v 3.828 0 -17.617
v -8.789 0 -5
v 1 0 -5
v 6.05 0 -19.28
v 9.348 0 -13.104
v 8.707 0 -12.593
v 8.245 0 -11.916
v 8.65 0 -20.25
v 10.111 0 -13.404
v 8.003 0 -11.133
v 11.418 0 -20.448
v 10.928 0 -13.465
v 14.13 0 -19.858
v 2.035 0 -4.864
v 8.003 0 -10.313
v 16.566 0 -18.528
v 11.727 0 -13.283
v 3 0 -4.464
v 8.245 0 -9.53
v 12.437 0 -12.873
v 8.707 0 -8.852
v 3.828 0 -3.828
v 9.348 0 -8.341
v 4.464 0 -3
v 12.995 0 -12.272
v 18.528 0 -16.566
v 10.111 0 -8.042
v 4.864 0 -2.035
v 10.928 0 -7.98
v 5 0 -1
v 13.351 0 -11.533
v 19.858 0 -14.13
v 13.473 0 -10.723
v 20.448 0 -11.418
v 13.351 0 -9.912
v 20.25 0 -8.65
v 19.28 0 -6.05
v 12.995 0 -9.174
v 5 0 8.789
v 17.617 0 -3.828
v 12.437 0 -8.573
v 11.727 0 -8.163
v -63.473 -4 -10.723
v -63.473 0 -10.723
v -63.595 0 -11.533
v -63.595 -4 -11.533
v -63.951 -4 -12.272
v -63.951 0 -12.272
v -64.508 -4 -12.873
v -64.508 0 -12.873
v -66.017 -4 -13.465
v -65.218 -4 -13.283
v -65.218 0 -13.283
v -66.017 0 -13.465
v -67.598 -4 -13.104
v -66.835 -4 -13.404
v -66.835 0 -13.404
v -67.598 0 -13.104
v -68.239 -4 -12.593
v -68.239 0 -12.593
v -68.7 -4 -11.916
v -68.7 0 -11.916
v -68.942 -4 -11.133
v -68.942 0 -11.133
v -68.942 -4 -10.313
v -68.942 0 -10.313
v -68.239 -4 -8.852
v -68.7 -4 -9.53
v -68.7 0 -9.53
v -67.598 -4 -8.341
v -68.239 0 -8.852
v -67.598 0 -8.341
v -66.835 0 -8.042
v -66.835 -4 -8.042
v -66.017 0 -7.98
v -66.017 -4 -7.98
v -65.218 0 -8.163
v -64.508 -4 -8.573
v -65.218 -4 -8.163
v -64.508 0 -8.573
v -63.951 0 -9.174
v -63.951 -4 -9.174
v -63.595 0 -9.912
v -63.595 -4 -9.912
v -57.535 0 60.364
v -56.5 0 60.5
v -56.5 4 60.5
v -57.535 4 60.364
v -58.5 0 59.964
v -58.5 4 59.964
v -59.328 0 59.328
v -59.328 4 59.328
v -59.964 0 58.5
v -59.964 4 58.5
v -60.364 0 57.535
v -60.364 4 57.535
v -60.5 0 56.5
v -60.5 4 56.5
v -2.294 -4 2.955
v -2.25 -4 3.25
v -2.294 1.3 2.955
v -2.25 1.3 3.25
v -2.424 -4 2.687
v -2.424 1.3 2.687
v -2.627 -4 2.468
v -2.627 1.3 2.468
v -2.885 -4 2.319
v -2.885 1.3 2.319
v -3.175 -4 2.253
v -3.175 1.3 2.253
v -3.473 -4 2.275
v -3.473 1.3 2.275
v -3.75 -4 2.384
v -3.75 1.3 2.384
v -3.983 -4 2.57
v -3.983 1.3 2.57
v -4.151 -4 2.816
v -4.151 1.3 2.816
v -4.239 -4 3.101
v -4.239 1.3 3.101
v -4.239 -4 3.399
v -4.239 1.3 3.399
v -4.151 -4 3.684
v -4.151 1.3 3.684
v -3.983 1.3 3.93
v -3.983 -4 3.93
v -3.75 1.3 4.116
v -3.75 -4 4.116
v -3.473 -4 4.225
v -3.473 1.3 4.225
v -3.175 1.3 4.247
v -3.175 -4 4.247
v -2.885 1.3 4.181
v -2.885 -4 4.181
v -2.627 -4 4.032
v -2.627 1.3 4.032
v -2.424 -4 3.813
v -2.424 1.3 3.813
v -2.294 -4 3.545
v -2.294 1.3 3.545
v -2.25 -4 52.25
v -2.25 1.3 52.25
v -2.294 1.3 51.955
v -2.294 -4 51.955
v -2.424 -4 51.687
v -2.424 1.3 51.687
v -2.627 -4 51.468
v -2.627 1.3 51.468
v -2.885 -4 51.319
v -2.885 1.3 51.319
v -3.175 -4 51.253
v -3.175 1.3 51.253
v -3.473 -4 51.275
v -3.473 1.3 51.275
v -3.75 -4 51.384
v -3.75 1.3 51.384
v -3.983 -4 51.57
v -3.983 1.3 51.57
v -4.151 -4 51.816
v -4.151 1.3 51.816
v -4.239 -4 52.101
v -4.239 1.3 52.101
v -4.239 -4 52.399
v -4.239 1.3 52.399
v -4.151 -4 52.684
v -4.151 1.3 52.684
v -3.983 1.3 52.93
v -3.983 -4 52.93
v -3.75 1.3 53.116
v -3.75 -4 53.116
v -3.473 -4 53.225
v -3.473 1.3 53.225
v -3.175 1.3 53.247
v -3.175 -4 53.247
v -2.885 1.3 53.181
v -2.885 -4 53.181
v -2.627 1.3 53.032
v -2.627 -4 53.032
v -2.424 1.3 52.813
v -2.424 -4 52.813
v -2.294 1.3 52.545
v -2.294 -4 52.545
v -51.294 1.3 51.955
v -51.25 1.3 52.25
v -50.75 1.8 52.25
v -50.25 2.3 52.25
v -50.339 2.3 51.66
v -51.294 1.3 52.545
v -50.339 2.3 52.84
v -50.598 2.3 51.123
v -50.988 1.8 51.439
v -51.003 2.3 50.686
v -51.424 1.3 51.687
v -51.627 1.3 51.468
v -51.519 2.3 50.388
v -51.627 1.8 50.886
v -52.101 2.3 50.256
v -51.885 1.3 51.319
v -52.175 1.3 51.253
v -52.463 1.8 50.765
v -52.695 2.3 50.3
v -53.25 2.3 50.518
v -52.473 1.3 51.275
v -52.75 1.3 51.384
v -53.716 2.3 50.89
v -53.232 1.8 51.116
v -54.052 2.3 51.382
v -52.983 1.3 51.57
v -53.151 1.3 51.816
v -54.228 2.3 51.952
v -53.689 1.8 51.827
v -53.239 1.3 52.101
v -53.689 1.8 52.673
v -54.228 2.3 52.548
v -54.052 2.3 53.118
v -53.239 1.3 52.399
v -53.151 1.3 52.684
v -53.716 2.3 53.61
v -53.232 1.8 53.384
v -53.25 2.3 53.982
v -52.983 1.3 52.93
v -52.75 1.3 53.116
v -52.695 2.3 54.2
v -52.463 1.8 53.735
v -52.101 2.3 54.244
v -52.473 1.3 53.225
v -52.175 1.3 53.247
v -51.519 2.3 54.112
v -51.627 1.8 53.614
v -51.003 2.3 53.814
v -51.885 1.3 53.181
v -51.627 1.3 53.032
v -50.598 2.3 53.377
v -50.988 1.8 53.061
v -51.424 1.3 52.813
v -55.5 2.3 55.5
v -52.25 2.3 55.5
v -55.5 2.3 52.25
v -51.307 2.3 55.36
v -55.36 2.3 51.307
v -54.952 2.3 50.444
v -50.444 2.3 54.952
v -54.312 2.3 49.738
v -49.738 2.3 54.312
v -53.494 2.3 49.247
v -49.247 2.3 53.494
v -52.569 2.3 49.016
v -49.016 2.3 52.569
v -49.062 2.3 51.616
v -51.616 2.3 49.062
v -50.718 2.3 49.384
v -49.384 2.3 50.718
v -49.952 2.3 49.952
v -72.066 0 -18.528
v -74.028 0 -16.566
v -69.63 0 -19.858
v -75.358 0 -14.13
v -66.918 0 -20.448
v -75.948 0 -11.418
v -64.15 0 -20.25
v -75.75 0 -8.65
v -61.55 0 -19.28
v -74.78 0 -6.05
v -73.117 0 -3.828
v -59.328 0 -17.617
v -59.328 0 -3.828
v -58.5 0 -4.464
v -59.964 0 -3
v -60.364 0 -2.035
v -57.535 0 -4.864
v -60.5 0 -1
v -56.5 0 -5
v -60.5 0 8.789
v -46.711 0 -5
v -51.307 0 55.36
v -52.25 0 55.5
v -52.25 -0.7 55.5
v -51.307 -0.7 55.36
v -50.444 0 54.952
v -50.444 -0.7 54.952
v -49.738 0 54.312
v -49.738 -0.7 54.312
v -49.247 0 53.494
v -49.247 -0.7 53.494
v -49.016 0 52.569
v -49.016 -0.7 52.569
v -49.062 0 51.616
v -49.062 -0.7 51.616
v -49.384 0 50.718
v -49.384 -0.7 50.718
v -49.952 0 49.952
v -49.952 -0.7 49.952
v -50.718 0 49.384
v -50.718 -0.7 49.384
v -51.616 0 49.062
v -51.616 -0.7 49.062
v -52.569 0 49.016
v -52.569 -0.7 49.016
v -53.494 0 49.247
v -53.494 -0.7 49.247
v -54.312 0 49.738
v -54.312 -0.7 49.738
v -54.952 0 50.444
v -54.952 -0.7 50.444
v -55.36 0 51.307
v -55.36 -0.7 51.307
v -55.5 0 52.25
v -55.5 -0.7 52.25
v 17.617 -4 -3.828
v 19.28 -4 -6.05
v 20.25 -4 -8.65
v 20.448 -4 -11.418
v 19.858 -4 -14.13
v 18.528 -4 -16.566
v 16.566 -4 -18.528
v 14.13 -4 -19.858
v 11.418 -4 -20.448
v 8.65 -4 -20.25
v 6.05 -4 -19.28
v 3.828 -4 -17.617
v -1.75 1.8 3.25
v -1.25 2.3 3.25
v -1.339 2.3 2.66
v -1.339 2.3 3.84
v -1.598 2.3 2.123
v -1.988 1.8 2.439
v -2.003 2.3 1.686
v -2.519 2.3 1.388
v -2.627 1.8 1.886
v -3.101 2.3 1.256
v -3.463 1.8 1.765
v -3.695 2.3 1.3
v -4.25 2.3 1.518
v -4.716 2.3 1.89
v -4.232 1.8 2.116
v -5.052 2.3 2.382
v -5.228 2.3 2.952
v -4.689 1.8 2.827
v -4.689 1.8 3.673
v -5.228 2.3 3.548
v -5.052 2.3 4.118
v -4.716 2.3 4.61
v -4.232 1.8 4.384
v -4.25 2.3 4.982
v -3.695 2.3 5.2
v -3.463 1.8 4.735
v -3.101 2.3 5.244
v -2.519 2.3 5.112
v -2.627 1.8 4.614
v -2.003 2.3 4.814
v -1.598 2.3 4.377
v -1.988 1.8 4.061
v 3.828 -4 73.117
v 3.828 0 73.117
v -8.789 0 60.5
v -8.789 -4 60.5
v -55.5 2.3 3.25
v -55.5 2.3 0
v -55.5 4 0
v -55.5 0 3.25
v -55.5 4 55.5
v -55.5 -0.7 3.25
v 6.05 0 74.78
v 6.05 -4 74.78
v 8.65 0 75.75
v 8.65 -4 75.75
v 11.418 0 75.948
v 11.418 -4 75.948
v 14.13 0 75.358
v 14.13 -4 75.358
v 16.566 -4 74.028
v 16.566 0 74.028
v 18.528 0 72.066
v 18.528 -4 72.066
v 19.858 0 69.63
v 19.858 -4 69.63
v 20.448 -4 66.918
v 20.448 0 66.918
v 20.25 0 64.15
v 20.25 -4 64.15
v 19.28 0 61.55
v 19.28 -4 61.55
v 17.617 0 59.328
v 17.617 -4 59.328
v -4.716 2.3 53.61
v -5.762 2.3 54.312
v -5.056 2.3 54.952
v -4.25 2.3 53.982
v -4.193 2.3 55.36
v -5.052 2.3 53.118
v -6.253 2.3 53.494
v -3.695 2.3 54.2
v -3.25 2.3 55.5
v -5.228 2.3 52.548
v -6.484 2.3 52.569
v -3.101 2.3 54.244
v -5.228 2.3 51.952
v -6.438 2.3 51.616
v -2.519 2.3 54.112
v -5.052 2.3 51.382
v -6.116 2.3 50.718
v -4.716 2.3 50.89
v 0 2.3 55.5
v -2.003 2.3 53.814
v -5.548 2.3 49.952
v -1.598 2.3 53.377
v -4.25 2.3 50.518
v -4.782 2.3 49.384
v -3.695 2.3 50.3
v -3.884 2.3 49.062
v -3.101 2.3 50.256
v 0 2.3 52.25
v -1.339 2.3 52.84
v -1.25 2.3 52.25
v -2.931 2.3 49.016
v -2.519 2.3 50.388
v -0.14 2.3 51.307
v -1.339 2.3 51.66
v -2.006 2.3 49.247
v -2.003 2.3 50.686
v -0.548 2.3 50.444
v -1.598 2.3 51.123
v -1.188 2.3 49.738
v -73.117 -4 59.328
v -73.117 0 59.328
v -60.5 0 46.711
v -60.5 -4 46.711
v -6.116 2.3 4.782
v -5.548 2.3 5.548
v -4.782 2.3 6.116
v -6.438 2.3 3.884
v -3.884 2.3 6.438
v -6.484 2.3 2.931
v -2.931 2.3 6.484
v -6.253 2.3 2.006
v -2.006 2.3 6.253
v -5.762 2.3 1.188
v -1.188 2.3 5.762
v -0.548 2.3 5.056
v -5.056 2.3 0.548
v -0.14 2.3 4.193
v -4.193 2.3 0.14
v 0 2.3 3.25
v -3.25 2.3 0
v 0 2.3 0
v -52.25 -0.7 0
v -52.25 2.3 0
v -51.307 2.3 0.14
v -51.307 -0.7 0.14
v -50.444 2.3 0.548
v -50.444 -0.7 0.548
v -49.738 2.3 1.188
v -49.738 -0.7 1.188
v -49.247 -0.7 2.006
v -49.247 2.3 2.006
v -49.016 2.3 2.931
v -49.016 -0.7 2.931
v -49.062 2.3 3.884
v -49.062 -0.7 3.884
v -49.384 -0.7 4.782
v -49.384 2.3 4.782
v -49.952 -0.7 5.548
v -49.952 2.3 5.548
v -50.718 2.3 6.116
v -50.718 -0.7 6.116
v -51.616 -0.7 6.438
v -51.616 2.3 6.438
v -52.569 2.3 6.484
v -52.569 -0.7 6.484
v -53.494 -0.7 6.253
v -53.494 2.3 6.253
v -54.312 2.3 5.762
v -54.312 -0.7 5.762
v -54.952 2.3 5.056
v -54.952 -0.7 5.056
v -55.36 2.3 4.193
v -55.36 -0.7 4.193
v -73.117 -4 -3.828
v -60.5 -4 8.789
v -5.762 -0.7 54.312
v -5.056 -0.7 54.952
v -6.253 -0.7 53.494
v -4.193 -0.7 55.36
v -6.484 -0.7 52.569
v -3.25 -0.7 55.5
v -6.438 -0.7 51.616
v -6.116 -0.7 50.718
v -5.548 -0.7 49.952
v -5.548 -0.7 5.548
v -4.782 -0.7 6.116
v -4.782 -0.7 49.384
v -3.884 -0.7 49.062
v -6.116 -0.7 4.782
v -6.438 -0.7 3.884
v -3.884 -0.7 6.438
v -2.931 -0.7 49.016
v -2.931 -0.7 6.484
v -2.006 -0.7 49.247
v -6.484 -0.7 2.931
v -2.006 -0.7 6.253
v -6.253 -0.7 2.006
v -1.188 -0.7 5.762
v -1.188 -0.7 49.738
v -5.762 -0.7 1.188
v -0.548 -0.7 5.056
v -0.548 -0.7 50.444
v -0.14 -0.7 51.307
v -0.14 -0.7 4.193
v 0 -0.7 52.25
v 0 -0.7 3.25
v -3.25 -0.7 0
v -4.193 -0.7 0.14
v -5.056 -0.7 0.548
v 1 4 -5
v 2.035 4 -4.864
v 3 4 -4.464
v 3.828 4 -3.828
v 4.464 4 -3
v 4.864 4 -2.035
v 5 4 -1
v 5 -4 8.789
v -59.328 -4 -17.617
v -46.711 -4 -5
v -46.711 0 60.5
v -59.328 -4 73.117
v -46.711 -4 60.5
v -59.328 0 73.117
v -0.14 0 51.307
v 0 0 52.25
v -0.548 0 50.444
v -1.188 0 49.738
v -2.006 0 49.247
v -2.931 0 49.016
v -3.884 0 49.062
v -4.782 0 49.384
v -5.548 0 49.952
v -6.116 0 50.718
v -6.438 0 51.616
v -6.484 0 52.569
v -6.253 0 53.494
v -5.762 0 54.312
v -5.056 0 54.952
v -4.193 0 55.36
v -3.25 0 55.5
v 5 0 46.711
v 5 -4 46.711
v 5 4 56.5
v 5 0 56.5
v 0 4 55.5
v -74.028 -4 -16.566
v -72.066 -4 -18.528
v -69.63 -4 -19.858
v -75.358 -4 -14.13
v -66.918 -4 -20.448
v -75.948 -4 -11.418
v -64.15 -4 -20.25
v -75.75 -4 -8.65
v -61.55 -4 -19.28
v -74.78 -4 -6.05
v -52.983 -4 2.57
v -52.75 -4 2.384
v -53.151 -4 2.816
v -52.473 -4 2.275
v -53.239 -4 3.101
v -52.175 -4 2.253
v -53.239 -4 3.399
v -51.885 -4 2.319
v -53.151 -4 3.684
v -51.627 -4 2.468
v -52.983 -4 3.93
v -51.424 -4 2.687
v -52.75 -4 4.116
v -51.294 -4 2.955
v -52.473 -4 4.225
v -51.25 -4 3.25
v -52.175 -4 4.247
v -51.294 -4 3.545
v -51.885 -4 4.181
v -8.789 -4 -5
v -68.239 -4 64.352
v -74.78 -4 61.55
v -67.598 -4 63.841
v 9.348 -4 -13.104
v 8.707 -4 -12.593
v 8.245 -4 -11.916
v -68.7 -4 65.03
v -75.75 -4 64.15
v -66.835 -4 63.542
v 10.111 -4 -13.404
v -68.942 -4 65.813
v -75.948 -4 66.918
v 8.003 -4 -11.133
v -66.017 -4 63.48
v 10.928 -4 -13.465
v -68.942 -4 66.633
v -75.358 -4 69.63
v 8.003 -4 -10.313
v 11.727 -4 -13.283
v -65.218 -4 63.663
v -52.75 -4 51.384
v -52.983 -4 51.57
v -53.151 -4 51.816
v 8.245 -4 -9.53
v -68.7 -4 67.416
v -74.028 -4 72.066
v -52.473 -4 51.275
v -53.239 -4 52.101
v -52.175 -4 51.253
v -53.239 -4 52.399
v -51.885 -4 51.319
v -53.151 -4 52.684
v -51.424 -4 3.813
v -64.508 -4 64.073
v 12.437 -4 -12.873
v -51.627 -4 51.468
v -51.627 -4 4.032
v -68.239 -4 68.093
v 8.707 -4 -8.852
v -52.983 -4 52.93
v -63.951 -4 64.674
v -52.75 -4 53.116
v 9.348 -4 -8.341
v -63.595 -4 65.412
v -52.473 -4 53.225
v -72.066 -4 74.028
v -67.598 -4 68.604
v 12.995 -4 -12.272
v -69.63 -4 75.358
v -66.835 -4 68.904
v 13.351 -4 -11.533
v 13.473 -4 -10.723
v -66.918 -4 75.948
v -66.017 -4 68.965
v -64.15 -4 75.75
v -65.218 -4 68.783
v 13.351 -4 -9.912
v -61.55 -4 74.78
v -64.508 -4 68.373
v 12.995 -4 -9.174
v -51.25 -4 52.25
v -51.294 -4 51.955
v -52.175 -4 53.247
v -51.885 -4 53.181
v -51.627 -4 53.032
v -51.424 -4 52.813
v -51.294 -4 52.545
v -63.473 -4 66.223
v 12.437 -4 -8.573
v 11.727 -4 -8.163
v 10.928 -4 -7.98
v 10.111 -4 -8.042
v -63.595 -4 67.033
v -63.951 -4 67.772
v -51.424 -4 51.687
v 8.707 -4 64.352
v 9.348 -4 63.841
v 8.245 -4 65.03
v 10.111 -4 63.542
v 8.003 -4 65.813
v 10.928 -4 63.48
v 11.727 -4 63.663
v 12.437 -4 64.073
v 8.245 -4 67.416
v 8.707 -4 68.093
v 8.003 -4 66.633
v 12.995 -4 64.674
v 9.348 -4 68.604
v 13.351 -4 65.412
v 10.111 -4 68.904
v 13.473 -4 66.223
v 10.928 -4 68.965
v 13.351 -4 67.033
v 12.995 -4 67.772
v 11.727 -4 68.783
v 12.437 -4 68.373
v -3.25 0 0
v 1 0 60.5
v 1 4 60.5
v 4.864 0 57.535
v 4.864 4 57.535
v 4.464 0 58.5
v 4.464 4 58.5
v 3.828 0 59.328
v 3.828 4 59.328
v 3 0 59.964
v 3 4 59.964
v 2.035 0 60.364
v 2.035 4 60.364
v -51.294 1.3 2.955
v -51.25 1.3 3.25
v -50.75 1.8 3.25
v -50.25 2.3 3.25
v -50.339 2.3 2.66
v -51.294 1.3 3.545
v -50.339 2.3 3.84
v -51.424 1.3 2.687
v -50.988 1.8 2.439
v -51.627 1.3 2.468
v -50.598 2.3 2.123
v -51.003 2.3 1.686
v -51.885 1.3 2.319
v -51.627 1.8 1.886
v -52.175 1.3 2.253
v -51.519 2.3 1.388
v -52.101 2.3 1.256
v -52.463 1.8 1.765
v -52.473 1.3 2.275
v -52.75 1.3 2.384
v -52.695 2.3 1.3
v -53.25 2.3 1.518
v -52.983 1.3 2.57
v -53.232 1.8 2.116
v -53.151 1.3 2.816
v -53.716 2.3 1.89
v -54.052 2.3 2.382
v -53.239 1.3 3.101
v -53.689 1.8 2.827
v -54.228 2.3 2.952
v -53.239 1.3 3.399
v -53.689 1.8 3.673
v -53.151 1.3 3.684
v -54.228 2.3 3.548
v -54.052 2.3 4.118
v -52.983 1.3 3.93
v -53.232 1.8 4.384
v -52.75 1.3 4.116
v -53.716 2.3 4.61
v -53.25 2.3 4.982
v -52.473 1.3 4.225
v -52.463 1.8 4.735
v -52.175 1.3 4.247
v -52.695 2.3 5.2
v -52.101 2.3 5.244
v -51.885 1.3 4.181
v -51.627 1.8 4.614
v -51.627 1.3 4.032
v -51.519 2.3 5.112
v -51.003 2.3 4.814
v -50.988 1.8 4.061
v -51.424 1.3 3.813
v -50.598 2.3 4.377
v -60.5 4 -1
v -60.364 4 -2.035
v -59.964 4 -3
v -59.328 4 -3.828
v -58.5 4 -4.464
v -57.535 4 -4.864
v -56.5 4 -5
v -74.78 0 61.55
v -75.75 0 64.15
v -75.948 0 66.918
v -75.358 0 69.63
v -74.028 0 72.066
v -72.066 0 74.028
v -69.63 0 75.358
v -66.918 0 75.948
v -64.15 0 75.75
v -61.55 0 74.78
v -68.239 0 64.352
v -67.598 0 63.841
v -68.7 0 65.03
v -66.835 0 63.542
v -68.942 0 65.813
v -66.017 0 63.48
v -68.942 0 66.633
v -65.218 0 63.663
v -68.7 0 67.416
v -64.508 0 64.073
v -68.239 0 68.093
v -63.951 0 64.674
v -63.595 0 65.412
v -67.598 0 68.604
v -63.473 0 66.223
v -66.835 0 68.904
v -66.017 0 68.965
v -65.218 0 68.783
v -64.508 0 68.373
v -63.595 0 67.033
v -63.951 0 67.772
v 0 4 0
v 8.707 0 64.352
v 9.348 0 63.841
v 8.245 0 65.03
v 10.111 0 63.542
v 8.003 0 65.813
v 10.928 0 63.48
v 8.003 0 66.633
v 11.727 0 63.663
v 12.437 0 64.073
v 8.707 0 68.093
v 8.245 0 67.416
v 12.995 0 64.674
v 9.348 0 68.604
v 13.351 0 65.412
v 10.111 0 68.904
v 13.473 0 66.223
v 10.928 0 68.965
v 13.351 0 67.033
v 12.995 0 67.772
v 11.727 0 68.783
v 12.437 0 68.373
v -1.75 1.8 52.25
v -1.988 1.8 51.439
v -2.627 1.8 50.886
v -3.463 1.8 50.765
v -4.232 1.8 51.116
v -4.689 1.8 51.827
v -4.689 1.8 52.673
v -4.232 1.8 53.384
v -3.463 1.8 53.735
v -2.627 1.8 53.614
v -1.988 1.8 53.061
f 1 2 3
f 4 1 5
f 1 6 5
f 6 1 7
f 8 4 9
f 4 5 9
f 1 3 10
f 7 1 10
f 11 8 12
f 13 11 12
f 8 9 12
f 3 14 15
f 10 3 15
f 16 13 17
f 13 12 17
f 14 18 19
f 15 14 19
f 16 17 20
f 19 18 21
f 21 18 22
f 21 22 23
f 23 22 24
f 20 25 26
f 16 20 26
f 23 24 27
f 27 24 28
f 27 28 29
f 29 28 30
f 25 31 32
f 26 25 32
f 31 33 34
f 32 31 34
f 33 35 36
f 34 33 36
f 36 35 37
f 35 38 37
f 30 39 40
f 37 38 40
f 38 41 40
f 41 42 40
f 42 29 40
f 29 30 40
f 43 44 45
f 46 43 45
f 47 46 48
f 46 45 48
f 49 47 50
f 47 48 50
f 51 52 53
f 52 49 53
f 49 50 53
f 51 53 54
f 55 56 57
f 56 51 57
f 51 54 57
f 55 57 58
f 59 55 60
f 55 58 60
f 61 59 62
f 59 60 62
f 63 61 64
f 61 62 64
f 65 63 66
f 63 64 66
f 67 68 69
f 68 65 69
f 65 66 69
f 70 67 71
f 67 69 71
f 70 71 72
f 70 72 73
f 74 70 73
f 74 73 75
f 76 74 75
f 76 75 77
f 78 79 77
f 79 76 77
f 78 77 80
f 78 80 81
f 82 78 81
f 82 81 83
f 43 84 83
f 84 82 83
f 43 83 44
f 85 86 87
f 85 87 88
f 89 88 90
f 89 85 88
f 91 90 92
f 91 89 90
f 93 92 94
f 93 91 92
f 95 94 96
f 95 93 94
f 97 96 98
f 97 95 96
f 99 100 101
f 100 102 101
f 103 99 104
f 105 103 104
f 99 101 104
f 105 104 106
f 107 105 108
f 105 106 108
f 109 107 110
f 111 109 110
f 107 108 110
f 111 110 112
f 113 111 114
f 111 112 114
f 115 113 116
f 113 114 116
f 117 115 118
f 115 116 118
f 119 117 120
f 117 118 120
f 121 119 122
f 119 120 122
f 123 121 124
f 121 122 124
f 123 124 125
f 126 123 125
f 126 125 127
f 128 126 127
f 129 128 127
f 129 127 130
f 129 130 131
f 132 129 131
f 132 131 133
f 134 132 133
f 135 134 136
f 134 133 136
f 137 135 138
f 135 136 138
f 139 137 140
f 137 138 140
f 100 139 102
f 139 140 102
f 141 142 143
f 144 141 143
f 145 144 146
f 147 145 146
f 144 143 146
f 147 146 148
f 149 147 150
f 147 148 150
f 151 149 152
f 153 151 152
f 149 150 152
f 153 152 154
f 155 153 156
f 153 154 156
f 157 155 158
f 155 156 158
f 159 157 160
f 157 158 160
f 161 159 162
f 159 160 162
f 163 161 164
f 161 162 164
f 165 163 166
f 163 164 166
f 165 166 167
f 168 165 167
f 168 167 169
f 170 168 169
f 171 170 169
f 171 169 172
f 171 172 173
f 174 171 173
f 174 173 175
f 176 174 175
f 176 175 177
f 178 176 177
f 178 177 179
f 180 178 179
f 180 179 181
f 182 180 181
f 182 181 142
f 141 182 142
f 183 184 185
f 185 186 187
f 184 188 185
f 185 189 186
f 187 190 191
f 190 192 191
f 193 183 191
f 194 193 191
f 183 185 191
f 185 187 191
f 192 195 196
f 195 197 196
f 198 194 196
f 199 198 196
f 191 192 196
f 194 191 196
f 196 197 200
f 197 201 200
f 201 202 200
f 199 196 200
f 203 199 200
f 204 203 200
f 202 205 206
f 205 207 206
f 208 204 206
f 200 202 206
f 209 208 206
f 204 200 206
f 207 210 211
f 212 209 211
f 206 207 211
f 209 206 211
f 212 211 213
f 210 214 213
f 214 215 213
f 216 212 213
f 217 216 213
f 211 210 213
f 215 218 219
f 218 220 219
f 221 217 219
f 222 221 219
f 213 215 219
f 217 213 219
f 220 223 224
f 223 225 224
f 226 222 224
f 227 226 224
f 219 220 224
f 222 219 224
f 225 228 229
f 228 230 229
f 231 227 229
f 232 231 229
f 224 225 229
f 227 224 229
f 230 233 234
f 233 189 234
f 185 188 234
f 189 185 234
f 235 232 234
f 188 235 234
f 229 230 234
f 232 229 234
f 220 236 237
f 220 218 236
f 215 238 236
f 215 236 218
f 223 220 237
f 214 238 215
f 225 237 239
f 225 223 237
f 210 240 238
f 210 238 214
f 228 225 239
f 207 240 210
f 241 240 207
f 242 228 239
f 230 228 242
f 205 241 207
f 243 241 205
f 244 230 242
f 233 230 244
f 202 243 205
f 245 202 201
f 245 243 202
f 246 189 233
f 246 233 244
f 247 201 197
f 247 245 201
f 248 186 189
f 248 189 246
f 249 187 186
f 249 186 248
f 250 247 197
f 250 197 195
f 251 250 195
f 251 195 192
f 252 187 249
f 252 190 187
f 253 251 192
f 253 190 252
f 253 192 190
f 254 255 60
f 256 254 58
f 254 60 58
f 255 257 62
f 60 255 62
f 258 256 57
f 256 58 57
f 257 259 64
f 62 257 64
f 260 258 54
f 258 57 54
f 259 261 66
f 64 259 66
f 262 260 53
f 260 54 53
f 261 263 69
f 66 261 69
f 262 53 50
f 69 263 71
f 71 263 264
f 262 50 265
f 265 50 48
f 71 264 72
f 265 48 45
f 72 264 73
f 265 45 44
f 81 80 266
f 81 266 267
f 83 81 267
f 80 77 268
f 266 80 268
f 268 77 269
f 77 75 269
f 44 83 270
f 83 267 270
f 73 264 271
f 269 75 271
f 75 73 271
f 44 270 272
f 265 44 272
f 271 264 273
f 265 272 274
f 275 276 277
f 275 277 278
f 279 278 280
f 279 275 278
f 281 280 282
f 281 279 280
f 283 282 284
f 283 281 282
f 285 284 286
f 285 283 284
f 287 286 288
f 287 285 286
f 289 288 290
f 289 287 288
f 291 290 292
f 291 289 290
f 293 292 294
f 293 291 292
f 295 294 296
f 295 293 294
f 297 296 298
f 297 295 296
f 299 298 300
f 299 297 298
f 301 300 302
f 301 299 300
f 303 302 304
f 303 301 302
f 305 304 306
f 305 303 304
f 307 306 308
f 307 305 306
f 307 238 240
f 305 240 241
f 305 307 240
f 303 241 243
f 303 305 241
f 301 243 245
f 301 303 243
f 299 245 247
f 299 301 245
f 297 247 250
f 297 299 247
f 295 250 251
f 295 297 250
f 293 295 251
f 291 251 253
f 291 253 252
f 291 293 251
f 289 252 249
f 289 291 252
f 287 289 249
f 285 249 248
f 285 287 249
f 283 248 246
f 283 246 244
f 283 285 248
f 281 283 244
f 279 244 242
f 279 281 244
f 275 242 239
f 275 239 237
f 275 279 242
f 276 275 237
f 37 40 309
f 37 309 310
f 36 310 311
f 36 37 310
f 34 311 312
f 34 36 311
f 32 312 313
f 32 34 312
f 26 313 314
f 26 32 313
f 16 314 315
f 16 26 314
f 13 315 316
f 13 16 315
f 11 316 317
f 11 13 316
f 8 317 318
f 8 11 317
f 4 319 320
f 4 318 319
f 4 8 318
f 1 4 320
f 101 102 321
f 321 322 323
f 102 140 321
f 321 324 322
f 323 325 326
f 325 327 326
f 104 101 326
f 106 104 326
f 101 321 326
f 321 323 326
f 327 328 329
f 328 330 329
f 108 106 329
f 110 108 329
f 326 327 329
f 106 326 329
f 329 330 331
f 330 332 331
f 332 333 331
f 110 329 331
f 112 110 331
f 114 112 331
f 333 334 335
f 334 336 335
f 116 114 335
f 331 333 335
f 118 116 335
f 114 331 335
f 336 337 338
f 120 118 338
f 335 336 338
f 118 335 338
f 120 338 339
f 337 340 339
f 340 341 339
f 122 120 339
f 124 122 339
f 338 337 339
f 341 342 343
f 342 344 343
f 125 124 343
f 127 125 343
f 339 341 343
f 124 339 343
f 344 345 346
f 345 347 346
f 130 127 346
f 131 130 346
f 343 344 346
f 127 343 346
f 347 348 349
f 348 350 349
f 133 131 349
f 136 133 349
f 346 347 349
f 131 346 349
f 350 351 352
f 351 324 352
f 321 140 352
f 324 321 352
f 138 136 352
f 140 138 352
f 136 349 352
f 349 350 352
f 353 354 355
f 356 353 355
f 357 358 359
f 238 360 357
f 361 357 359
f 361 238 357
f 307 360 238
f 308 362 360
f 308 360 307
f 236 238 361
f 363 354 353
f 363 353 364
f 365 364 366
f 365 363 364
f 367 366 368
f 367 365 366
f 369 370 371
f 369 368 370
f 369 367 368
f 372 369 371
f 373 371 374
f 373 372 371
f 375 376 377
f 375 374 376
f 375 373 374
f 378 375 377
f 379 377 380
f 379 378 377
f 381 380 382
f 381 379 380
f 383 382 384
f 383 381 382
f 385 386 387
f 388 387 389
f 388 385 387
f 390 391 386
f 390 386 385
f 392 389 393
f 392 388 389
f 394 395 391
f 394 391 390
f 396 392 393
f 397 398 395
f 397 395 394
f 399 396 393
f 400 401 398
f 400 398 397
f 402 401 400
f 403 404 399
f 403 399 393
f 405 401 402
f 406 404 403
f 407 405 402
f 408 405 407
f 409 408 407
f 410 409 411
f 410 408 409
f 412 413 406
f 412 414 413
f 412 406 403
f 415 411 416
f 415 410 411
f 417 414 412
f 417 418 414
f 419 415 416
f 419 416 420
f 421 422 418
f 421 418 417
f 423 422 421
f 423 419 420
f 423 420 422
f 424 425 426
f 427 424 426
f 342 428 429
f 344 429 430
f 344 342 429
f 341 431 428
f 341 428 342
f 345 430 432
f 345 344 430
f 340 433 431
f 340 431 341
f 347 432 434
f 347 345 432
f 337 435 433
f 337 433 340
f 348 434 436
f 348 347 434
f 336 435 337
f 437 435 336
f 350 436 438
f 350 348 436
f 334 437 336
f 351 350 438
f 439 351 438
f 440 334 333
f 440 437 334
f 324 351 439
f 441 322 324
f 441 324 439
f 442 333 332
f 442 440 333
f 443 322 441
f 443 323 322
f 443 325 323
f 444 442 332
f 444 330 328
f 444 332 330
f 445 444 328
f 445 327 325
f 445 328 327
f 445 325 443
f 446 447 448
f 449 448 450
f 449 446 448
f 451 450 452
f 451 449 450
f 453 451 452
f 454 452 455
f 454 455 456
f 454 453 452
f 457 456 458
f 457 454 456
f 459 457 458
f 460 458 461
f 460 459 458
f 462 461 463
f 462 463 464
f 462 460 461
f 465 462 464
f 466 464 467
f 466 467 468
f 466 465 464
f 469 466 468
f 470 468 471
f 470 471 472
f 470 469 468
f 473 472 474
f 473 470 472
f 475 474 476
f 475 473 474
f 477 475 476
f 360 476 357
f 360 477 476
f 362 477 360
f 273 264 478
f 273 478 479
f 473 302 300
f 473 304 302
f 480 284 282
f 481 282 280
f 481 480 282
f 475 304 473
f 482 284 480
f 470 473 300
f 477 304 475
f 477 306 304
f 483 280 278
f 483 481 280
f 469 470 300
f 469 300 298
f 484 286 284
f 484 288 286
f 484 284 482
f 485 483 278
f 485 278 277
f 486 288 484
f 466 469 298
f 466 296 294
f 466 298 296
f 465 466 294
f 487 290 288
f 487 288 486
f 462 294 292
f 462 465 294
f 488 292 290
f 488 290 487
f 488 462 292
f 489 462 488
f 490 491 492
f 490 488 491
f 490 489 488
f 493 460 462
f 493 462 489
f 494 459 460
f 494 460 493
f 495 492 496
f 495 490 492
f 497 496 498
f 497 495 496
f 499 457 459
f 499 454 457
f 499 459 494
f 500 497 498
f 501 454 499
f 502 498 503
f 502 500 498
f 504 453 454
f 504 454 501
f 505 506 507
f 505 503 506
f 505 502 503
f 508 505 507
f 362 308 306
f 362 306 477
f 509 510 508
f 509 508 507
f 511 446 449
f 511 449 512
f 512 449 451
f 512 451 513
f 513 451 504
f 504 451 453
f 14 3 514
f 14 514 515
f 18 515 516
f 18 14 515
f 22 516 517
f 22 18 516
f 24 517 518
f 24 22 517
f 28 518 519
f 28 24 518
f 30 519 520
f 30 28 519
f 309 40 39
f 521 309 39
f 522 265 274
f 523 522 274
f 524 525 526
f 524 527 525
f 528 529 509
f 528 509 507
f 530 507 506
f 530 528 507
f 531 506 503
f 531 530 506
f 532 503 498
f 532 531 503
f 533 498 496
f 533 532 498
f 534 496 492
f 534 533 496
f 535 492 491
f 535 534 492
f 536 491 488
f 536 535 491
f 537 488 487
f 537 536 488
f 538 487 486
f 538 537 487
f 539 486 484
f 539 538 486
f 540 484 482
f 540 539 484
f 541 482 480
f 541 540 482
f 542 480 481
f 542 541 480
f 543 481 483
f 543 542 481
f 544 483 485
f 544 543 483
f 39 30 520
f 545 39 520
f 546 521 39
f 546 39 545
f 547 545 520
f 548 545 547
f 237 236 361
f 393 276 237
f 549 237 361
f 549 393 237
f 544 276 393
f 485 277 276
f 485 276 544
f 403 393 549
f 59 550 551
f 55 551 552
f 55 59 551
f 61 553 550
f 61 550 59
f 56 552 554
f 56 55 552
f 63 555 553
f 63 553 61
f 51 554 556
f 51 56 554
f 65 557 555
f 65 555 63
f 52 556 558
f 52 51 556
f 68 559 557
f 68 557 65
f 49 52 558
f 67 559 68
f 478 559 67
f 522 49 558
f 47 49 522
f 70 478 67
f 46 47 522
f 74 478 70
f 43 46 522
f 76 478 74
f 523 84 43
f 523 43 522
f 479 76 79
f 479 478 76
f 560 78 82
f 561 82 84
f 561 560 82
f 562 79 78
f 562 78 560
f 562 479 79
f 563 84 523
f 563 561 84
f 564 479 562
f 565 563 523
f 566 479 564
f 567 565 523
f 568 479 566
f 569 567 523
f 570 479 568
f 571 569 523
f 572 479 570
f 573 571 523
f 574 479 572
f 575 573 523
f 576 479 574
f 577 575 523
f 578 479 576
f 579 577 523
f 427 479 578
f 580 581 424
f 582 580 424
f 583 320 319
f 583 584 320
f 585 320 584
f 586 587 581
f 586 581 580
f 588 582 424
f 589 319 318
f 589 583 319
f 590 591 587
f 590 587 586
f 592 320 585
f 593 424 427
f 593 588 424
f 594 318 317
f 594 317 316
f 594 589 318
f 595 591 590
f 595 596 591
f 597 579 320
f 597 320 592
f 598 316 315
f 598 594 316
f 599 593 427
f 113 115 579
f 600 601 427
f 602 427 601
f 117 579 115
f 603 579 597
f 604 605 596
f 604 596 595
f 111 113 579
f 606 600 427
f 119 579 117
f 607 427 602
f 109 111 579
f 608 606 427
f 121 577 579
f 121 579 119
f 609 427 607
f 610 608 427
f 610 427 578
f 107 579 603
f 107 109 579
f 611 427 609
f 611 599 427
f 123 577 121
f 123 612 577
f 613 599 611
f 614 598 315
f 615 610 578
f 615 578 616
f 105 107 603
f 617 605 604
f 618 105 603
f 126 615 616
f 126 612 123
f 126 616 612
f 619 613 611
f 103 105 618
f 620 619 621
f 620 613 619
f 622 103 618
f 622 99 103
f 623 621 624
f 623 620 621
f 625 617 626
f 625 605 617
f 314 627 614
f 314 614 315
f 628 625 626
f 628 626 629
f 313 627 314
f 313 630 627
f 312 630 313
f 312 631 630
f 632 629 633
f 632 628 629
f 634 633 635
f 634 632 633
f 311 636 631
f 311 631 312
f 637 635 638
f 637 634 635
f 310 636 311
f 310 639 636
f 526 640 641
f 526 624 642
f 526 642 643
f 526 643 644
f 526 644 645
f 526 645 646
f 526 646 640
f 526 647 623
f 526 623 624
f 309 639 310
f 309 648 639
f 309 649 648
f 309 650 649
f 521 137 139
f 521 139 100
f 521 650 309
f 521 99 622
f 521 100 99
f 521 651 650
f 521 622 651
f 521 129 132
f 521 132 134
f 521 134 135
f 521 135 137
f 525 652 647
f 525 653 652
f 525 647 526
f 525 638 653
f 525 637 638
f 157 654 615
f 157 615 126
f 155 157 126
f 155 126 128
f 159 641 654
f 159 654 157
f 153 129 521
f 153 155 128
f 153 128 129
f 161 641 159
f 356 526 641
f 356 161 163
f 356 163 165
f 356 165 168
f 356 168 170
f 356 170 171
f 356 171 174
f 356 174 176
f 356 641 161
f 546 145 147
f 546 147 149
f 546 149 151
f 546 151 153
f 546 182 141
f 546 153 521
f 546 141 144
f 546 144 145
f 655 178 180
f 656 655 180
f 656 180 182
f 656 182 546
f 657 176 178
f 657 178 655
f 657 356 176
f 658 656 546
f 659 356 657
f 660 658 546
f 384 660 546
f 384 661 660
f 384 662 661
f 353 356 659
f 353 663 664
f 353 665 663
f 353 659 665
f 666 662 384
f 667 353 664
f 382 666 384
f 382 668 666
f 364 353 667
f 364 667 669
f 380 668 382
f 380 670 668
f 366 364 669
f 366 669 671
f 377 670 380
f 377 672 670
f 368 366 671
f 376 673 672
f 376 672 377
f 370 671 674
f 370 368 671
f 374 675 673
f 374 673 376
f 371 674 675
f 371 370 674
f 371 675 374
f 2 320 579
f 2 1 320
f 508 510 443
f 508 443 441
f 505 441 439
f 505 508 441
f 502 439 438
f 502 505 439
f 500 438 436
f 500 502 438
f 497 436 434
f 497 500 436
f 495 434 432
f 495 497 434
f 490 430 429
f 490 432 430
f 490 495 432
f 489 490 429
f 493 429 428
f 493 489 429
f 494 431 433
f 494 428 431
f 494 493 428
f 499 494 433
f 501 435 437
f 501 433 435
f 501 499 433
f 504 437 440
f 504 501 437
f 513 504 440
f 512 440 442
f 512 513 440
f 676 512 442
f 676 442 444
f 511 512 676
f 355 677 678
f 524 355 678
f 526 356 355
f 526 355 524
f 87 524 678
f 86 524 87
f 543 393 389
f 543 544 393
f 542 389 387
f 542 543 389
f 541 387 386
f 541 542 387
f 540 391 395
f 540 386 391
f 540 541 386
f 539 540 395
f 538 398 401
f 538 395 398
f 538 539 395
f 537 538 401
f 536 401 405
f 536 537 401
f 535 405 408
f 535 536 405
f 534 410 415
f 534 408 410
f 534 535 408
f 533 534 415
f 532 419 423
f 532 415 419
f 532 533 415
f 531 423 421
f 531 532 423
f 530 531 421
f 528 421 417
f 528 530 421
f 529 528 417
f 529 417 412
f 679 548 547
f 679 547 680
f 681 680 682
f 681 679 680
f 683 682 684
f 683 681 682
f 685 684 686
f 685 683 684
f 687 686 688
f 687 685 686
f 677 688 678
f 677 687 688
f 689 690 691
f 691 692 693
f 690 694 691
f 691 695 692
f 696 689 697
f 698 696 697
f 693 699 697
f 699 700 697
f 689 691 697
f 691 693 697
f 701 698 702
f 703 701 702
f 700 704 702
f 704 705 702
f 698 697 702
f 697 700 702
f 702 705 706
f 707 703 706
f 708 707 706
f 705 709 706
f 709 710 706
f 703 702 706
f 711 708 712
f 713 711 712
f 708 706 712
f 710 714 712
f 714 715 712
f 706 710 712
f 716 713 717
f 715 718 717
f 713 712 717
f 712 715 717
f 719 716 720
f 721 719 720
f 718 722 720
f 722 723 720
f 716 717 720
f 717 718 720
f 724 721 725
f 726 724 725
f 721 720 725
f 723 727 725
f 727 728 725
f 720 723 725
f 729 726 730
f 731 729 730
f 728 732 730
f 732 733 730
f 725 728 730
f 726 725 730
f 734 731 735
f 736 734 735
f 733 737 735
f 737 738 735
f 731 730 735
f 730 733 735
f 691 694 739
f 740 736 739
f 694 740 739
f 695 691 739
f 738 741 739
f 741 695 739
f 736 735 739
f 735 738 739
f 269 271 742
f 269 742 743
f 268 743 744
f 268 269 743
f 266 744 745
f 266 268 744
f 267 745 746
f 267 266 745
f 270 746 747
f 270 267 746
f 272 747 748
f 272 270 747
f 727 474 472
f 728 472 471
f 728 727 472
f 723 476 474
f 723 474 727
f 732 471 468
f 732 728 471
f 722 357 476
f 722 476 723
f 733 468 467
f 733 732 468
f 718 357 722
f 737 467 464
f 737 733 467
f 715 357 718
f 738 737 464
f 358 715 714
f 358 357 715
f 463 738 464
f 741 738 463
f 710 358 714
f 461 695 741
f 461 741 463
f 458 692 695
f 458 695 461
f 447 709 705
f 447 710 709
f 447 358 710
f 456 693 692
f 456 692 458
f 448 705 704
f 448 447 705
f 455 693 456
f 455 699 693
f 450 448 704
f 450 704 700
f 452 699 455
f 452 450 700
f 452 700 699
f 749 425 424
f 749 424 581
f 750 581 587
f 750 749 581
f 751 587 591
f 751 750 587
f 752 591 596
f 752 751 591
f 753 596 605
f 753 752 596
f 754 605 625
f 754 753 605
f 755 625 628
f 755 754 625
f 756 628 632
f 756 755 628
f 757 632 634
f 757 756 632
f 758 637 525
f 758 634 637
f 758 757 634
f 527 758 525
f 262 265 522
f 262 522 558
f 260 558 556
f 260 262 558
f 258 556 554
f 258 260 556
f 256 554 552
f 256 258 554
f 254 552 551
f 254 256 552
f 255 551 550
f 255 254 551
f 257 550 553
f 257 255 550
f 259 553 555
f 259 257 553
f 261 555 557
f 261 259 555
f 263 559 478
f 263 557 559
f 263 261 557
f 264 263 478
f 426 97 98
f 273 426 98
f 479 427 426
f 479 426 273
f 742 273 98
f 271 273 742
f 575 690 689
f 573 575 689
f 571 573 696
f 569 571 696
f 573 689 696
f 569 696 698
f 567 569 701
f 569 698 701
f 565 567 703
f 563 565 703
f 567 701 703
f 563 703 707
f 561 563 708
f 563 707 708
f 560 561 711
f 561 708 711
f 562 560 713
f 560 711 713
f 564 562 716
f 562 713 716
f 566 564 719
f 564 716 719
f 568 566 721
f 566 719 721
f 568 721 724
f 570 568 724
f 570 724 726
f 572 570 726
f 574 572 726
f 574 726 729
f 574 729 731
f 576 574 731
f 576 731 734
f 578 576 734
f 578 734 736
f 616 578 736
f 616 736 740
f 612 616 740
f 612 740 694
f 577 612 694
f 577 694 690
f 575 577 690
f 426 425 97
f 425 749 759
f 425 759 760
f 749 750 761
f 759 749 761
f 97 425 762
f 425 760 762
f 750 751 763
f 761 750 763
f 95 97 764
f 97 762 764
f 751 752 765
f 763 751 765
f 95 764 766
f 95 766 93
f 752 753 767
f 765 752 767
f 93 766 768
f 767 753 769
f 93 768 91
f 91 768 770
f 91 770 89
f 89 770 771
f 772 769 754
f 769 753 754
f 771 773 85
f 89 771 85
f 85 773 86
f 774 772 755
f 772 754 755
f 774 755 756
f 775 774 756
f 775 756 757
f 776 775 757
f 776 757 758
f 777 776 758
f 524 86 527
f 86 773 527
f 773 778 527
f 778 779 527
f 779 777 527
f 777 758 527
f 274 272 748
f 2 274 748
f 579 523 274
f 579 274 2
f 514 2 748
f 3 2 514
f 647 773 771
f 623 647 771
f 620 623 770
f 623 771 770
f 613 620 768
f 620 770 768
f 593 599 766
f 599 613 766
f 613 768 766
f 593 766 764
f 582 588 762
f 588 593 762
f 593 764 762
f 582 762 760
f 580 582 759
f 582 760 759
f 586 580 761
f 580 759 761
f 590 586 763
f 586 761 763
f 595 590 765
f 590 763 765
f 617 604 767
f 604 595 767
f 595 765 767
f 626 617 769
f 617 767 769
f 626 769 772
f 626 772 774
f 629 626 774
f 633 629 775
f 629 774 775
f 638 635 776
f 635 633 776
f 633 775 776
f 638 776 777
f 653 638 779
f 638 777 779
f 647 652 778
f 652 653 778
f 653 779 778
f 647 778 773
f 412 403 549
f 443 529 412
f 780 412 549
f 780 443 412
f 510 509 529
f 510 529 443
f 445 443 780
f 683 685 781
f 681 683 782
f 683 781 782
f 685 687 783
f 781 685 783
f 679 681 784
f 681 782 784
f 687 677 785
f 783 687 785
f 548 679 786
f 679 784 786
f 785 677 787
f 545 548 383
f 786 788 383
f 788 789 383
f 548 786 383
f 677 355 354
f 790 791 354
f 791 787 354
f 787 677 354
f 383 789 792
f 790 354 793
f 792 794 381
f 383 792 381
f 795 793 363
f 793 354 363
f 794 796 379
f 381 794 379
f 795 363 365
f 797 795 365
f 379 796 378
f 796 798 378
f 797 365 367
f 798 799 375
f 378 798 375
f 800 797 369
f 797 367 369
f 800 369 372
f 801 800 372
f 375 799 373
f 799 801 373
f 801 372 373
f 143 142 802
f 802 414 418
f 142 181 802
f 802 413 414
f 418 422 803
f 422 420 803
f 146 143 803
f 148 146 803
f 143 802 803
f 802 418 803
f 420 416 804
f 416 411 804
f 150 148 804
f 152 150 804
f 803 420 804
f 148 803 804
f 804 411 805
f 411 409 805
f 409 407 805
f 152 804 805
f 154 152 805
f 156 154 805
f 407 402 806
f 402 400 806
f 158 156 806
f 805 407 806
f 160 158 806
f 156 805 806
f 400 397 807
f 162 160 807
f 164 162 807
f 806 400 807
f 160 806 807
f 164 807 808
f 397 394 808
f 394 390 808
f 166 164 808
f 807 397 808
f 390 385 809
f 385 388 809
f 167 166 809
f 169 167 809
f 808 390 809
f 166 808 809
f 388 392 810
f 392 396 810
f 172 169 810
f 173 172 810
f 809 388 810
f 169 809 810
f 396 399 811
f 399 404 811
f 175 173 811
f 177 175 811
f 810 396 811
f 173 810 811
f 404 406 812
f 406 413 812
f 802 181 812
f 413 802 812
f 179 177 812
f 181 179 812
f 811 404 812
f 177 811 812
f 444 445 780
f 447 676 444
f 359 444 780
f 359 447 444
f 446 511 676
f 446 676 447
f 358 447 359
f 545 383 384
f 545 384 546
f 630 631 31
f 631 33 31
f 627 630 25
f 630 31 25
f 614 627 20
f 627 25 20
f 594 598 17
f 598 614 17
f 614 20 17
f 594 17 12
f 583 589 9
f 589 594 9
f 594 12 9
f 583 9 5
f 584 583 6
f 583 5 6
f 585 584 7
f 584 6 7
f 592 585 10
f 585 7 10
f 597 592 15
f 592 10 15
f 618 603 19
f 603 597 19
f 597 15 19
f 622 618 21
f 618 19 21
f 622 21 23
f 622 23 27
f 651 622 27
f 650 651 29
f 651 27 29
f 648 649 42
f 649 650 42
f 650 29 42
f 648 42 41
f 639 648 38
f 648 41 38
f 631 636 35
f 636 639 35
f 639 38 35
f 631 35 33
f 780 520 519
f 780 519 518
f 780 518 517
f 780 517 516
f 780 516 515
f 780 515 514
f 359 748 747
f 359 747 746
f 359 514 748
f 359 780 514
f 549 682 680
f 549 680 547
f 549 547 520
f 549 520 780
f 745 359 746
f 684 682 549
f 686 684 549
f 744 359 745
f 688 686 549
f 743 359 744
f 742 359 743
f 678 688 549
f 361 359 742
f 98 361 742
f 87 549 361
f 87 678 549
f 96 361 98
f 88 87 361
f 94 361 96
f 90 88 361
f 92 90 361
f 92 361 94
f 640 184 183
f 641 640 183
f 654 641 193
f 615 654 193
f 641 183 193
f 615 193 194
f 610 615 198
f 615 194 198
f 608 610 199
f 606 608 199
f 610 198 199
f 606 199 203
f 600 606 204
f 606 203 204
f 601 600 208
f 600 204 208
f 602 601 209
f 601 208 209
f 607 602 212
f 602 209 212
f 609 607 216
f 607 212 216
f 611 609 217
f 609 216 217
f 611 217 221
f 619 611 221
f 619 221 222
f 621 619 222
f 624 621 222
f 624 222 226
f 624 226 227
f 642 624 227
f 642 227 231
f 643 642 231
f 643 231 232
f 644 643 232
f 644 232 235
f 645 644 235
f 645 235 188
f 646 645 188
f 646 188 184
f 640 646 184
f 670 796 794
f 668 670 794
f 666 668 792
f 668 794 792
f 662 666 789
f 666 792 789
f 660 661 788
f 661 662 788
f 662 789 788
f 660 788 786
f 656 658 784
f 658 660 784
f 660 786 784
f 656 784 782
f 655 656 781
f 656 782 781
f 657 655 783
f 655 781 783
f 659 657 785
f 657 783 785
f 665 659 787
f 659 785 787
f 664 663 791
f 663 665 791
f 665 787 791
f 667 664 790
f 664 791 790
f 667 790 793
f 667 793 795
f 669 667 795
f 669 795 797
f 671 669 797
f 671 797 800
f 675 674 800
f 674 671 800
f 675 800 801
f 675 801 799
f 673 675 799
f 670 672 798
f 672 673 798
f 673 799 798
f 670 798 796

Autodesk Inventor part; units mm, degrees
ref_plane "YZ Plane" through (0, 0, 0) normal (1, 0, 0) x (0, 1, 0)
ref_plane "XZ Plane" through (0, 0, 0) normal (0, 1, 0) x (-1, 0, 0)
ref_plane "XY Plane" through (0, 0, 0) normal (0, 0, 1) x (1, 0, 0)
sketch "Sketch1" plane through (0, 0, 0) normal (0, 1, 0) x (-1, 0, 0)
  line L0 (0, 0) -> (55.5, 0)
  line L1 (55.5, 0) -> (55.5, 55.5)
  line L2 (55.5, 55.5) -> (0, 55.5)
  line L3 (0, 55.5) -> (0, 0)
  line L4 (-1, 60.5) -> (56.5, 60.5)
  line L5 (60.5, 56.5) -> (60.5, -1)
  line L6 (56.5, -5) -> (-1, -5)
  line L7 (-5, -1) -> (-5, 56.5)
  arc A0 (60.5, 56.5) -> (56.5, 60.5) centre (56.5, 56.5) ccw
  arc A1 (56.5, -5) -> (60.5, -1) centre (56.5, -1) ccw
  arc A2 (-5, -1) -> (-1, -5) centre (-1, -1) ccw
  arc A3 (-1, 60.5) -> (-5, 56.5) centre (-1, 56.5) ccw
  dimension "d0" = 55.5
  dimension "d1" = 55.5
  dimension "d2" = 5
  dimension "d3" = 4
extrude "Extrusion1" add sketch "Sketch1" along normal blind 4
sketch "Sketch2" plane through (0, 0, 0) normal (0, -1, 0) x (1, 0, 0)
  line L0 (1, -5) -> (-56.5, -5) projected
  arc A0 (1, -5) -> (5, -1) centre (1, -1) ccw projected
  line L1 (5, 56.5) -> (5, -1) projected
  arc A1 (5, 56.5) -> (1, 60.5) centre (1, 56.5) ccw projected
  line L2 (-56.5, 60.5) -> (1, 60.5) projected
  arc A2 (-56.5, 60.5) -> (-60.5, 56.5) centre (-56.5, 56.5) ccw projected
  line L3 (-60.5, -1) -> (-60.5, 56.5) projected
  arc A3 (-60.5, -1) -> (-56.5, -5) centre (-56.5, -1) ccw projected
  line L4 (0, 0) -> (0, 55.5) projected
  line L5 (-55.5, 0) -> (0, 0) projected
  line L6 (-55.5, 55.5) -> (-55.5, 0) projected
  line L7 (0, 55.5) -> (-55.5, 55.5) projected
  line L8 (-77.75, 77.75) -> (22.25, 77.75) construction
  line L9 (22.25, 77.75) -> (22.25, -22.25) construction
  line L10 (22.25, -22.25) -> (-77.75, -22.25) construction
  line L11 (-77.75, -22.25) -> (-77.75, 77.75) construction
  line L12 (-77.75, 77.75) -> (22.25, -22.25) construction
  line L13 (22.25, 77.75) -> (-77.75, -22.25) construction
  circle A4 centre (10.7227, 66.2227) radius 2.75
  arc A5 (17.617, 59.3284) -> (3.8284, 73.117) centre (10.7227, 66.2227) ccw
  arc A6 (5, 56.5) -> (1, 60.5) centre (1, 56.5) ccw projected
  line L14 (17.617, 59.3284) -> (5, 46.7114)
  line L15 (3.8284, 73.117) -> (-8.7886, 60.5)
  line L16 (-59.3284, 73.117) -> (-46.7114, 60.5)
  arc A7 (-59.3284, 73.117) -> (-73.117, 59.3284) centre (-66.2227, 66.2227) ccw
  circle A8 centre (-66.2227, 66.2227) radius 2.75
  line L17 (-73.117, 59.3284) -> (-60.5, 46.7114)
  line L18 (-73.117, -3.8284) -> (-60.5, 8.7886)
  arc A9 (-73.117, -3.8284) -> (-59.3284, -17.617) centre (-66.2227, -10.7227) ccw
  circle A10 centre (-66.2227, -10.7227) radius 2.75
  line L19 (-59.3284, -17.617) -> (-46.7114, -5)
  line L20 (3.8284, -17.617) -> (-8.7886, -5)
  arc A11 (3.8284, -17.617) -> (17.617, -3.8284) centre (10.7227, -10.7227) ccw
  circle A12 centre (10.7227, -10.7227) radius 2.75
  line L21 (17.617, -3.8284) -> (5, 8.7886)
  point P0 (-27.75, 27.75)
  dimension "d6" = 100
  dimension "d7" = 100
  dimension "d8" = 5.5
  dimension "d9" = 7
  dimension "d12" = 360
extrude "Extrusion2" add sketch "Sketch2" along normal blind 4 contours A0 L1 L21 A11 L20 L0 | L0 A3 L3 A2 L2 A1 L1 A0 | L19 A9 L18 L3 A3 L0 | L1 A1 L2 L15 A5 L14 | L17 A7 L16 L2 A2 L3 | L5 L6 L7 L4
sketch "Sketch3" plane through (0, 0, 0) normal (0, 1, 0) x (1, 0, 0)
  line L0 (-52.25, -52.25) -> (-3.25, -52.25) construction
  line L1 (-3.25, -52.25) -> (-3.25, -3.25) construction
  line L2 (-3.25, -3.25) -> (-52.25, -3.25) construction
  line L3 (-52.25, -3.25) -> (-52.25, -52.25) construction
  line L4 (-52.25, -52.25) -> (-52.25, -55.5) construction
  line L5 (-52.25, -52.25) -> (-55.5, -52.25) construction
  line L6 (-55.5, -55.5) -> (-55.5, 0) construction
  line L7 (-3.25, -3.25) -> (0, -3.25) construction
  line L8 (0, 0) -> (0, -55.5) construction
  line L9 (-3.25, -3.25) -> (-3.25, 0) construction
  line L10 (-55.5, 0) -> (0, 0) construction
  line L11 (0, -55.5) -> (-55.5, -55.5) projected
  circle A0 centre (-52.25, -52.25) radius 3.25
  circle A1 centre (-52.25, -3.25) radius 3.25
  circle A2 centre (-3.25, -3.25) radius 3.25
  circle A3 centre (-3.25, -52.25) radius 3.25
  line L12 (-55.5, 0) -> (0, 0) projected
  line L13 (-55.5, -55.5) -> (-55.5, 0) projected
  line L14 (0, -55.5) -> (-55.5, -55.5) projected
  line L15 (0, 0) -> (0, -55.5) projected
  point P0 (-3.25, 0)
  point P1 (0, -3.25)
  point P2 (0, -52.25)
  point P3 (-3.25, -55.5)
  point P4 (-55.5, -3.25)
  point P5 (-52.25, 0)
  dimension "d16" = 49
  dimension "d17" = 49
extrude "Extrusion3" add sketch "Sketch3" along normal blind 2.3 contours L11 A3 L15 | A3 | L11 L13 A0 | A0 | A2 | A2 L12 L15 | L13 L12 A1 | A1
sketch "Sketch4" plane through (0, 2.3, 0) normal (0, 1, 0) x (1, 0, 0)
  arc A0 (0, -52.25) -> (-3.25, -55.5) centre (-3.25, -52.25) ccw projected
  line L0 (0, -3.25) -> (0, -52.25) projected
  arc A1 (-3.25, 0) -> (0, -3.25) centre (-3.25, -3.25) ccw projected
  line L1 (-52.25, 0) -> (-3.25, 0) projected
  arc A2 (-55.5, -3.25) -> (-52.25, 0) centre (-52.25, -3.25) ccw projected
  line L2 (-55.5, -52.25) -> (-55.5, -3.25) projected
  arc A3 (-52.25, -55.5) -> (-55.5, -52.25) centre (-52.25, -52.25) ccw projected
  line L3 (-3.25, -55.5) -> (-52.25, -55.5) projected
  point P0 (0, 0)
extrude "Extrusion4" cut sketch "Sketch4" against normal blind 3
sketch "Sketch5" plane through (0, 2.3, 0) normal (0, 1, 0) x (1, 0, 0)
  line L0 (0, 0) -> (0, -3.25) projected
  line L1 (-3.25, 0) -> (0, 0) projected
  arc A0 (-3.25, 0) -> (0, -3.25) centre (-3.25, -3.25) ccw projected
  arc A1 (0, -52.25) -> (-3.25, -55.5) centre (-3.25, -52.25) ccw projected
  line L2 (0, -55.5) -> (-3.25, -55.5) projected
  line L3 (0, -52.25) -> (0, -55.5) projected
  line L4 (-52.25, -55.5) -> (-55.5, -55.5) projected
  arc A2 (-52.25, -55.5) -> (-55.5, -52.25) centre (-52.25, -52.25) ccw projected
  line L5 (-55.5, -55.5) -> (-55.5, -52.25) projected
  arc A3 (-55.5, -3.25) -> (-52.25, 0) centre (-52.25, -3.25) ccw projected
  line L6 (-55.5, 0) -> (-52.25, 0) projected
  line L7 (-55.5, -3.25) -> (-55.5, 0) projected
  circle A4 centre (-52.25, -52.25) radius 1
  arc A5 (-55.5, -3.25) -> (-52.25, 0) centre (-52.25, -3.25) ccw projected
  circle A6 centre (-52.25, -3.25) radius 1
  arc A7 (-3.25, 0) -> (0, -3.25) centre (-3.25, -3.25) ccw projected
  circle A8 centre (-3.25, -3.25) radius 1
  circle A9 centre (-3.25, -52.25) radius 1
  dimension "d23" = 2
  dimension "d24" = 2
  dimension "d25" = 2
  dimension "d26" = 2
extrude "Extrusion5" cut sketch "Sketch5" against normal up to next contours A4 | A6 | A8 | A9
chamfer "Chamfer1" distance 1 angle 45 4 edges at (-53.25, 2.3, 52.25) (-53.25, 2.3, 3.25) (-4.25, 2.3, 52.25) (-4.25, 2.3, 3.25)
equation "\"d24\" = d23"
equation "\"d25\" = d23"
equation "\"d26\" = d23"
properties part number "Drok L298 DC Motor Driver Mount"
